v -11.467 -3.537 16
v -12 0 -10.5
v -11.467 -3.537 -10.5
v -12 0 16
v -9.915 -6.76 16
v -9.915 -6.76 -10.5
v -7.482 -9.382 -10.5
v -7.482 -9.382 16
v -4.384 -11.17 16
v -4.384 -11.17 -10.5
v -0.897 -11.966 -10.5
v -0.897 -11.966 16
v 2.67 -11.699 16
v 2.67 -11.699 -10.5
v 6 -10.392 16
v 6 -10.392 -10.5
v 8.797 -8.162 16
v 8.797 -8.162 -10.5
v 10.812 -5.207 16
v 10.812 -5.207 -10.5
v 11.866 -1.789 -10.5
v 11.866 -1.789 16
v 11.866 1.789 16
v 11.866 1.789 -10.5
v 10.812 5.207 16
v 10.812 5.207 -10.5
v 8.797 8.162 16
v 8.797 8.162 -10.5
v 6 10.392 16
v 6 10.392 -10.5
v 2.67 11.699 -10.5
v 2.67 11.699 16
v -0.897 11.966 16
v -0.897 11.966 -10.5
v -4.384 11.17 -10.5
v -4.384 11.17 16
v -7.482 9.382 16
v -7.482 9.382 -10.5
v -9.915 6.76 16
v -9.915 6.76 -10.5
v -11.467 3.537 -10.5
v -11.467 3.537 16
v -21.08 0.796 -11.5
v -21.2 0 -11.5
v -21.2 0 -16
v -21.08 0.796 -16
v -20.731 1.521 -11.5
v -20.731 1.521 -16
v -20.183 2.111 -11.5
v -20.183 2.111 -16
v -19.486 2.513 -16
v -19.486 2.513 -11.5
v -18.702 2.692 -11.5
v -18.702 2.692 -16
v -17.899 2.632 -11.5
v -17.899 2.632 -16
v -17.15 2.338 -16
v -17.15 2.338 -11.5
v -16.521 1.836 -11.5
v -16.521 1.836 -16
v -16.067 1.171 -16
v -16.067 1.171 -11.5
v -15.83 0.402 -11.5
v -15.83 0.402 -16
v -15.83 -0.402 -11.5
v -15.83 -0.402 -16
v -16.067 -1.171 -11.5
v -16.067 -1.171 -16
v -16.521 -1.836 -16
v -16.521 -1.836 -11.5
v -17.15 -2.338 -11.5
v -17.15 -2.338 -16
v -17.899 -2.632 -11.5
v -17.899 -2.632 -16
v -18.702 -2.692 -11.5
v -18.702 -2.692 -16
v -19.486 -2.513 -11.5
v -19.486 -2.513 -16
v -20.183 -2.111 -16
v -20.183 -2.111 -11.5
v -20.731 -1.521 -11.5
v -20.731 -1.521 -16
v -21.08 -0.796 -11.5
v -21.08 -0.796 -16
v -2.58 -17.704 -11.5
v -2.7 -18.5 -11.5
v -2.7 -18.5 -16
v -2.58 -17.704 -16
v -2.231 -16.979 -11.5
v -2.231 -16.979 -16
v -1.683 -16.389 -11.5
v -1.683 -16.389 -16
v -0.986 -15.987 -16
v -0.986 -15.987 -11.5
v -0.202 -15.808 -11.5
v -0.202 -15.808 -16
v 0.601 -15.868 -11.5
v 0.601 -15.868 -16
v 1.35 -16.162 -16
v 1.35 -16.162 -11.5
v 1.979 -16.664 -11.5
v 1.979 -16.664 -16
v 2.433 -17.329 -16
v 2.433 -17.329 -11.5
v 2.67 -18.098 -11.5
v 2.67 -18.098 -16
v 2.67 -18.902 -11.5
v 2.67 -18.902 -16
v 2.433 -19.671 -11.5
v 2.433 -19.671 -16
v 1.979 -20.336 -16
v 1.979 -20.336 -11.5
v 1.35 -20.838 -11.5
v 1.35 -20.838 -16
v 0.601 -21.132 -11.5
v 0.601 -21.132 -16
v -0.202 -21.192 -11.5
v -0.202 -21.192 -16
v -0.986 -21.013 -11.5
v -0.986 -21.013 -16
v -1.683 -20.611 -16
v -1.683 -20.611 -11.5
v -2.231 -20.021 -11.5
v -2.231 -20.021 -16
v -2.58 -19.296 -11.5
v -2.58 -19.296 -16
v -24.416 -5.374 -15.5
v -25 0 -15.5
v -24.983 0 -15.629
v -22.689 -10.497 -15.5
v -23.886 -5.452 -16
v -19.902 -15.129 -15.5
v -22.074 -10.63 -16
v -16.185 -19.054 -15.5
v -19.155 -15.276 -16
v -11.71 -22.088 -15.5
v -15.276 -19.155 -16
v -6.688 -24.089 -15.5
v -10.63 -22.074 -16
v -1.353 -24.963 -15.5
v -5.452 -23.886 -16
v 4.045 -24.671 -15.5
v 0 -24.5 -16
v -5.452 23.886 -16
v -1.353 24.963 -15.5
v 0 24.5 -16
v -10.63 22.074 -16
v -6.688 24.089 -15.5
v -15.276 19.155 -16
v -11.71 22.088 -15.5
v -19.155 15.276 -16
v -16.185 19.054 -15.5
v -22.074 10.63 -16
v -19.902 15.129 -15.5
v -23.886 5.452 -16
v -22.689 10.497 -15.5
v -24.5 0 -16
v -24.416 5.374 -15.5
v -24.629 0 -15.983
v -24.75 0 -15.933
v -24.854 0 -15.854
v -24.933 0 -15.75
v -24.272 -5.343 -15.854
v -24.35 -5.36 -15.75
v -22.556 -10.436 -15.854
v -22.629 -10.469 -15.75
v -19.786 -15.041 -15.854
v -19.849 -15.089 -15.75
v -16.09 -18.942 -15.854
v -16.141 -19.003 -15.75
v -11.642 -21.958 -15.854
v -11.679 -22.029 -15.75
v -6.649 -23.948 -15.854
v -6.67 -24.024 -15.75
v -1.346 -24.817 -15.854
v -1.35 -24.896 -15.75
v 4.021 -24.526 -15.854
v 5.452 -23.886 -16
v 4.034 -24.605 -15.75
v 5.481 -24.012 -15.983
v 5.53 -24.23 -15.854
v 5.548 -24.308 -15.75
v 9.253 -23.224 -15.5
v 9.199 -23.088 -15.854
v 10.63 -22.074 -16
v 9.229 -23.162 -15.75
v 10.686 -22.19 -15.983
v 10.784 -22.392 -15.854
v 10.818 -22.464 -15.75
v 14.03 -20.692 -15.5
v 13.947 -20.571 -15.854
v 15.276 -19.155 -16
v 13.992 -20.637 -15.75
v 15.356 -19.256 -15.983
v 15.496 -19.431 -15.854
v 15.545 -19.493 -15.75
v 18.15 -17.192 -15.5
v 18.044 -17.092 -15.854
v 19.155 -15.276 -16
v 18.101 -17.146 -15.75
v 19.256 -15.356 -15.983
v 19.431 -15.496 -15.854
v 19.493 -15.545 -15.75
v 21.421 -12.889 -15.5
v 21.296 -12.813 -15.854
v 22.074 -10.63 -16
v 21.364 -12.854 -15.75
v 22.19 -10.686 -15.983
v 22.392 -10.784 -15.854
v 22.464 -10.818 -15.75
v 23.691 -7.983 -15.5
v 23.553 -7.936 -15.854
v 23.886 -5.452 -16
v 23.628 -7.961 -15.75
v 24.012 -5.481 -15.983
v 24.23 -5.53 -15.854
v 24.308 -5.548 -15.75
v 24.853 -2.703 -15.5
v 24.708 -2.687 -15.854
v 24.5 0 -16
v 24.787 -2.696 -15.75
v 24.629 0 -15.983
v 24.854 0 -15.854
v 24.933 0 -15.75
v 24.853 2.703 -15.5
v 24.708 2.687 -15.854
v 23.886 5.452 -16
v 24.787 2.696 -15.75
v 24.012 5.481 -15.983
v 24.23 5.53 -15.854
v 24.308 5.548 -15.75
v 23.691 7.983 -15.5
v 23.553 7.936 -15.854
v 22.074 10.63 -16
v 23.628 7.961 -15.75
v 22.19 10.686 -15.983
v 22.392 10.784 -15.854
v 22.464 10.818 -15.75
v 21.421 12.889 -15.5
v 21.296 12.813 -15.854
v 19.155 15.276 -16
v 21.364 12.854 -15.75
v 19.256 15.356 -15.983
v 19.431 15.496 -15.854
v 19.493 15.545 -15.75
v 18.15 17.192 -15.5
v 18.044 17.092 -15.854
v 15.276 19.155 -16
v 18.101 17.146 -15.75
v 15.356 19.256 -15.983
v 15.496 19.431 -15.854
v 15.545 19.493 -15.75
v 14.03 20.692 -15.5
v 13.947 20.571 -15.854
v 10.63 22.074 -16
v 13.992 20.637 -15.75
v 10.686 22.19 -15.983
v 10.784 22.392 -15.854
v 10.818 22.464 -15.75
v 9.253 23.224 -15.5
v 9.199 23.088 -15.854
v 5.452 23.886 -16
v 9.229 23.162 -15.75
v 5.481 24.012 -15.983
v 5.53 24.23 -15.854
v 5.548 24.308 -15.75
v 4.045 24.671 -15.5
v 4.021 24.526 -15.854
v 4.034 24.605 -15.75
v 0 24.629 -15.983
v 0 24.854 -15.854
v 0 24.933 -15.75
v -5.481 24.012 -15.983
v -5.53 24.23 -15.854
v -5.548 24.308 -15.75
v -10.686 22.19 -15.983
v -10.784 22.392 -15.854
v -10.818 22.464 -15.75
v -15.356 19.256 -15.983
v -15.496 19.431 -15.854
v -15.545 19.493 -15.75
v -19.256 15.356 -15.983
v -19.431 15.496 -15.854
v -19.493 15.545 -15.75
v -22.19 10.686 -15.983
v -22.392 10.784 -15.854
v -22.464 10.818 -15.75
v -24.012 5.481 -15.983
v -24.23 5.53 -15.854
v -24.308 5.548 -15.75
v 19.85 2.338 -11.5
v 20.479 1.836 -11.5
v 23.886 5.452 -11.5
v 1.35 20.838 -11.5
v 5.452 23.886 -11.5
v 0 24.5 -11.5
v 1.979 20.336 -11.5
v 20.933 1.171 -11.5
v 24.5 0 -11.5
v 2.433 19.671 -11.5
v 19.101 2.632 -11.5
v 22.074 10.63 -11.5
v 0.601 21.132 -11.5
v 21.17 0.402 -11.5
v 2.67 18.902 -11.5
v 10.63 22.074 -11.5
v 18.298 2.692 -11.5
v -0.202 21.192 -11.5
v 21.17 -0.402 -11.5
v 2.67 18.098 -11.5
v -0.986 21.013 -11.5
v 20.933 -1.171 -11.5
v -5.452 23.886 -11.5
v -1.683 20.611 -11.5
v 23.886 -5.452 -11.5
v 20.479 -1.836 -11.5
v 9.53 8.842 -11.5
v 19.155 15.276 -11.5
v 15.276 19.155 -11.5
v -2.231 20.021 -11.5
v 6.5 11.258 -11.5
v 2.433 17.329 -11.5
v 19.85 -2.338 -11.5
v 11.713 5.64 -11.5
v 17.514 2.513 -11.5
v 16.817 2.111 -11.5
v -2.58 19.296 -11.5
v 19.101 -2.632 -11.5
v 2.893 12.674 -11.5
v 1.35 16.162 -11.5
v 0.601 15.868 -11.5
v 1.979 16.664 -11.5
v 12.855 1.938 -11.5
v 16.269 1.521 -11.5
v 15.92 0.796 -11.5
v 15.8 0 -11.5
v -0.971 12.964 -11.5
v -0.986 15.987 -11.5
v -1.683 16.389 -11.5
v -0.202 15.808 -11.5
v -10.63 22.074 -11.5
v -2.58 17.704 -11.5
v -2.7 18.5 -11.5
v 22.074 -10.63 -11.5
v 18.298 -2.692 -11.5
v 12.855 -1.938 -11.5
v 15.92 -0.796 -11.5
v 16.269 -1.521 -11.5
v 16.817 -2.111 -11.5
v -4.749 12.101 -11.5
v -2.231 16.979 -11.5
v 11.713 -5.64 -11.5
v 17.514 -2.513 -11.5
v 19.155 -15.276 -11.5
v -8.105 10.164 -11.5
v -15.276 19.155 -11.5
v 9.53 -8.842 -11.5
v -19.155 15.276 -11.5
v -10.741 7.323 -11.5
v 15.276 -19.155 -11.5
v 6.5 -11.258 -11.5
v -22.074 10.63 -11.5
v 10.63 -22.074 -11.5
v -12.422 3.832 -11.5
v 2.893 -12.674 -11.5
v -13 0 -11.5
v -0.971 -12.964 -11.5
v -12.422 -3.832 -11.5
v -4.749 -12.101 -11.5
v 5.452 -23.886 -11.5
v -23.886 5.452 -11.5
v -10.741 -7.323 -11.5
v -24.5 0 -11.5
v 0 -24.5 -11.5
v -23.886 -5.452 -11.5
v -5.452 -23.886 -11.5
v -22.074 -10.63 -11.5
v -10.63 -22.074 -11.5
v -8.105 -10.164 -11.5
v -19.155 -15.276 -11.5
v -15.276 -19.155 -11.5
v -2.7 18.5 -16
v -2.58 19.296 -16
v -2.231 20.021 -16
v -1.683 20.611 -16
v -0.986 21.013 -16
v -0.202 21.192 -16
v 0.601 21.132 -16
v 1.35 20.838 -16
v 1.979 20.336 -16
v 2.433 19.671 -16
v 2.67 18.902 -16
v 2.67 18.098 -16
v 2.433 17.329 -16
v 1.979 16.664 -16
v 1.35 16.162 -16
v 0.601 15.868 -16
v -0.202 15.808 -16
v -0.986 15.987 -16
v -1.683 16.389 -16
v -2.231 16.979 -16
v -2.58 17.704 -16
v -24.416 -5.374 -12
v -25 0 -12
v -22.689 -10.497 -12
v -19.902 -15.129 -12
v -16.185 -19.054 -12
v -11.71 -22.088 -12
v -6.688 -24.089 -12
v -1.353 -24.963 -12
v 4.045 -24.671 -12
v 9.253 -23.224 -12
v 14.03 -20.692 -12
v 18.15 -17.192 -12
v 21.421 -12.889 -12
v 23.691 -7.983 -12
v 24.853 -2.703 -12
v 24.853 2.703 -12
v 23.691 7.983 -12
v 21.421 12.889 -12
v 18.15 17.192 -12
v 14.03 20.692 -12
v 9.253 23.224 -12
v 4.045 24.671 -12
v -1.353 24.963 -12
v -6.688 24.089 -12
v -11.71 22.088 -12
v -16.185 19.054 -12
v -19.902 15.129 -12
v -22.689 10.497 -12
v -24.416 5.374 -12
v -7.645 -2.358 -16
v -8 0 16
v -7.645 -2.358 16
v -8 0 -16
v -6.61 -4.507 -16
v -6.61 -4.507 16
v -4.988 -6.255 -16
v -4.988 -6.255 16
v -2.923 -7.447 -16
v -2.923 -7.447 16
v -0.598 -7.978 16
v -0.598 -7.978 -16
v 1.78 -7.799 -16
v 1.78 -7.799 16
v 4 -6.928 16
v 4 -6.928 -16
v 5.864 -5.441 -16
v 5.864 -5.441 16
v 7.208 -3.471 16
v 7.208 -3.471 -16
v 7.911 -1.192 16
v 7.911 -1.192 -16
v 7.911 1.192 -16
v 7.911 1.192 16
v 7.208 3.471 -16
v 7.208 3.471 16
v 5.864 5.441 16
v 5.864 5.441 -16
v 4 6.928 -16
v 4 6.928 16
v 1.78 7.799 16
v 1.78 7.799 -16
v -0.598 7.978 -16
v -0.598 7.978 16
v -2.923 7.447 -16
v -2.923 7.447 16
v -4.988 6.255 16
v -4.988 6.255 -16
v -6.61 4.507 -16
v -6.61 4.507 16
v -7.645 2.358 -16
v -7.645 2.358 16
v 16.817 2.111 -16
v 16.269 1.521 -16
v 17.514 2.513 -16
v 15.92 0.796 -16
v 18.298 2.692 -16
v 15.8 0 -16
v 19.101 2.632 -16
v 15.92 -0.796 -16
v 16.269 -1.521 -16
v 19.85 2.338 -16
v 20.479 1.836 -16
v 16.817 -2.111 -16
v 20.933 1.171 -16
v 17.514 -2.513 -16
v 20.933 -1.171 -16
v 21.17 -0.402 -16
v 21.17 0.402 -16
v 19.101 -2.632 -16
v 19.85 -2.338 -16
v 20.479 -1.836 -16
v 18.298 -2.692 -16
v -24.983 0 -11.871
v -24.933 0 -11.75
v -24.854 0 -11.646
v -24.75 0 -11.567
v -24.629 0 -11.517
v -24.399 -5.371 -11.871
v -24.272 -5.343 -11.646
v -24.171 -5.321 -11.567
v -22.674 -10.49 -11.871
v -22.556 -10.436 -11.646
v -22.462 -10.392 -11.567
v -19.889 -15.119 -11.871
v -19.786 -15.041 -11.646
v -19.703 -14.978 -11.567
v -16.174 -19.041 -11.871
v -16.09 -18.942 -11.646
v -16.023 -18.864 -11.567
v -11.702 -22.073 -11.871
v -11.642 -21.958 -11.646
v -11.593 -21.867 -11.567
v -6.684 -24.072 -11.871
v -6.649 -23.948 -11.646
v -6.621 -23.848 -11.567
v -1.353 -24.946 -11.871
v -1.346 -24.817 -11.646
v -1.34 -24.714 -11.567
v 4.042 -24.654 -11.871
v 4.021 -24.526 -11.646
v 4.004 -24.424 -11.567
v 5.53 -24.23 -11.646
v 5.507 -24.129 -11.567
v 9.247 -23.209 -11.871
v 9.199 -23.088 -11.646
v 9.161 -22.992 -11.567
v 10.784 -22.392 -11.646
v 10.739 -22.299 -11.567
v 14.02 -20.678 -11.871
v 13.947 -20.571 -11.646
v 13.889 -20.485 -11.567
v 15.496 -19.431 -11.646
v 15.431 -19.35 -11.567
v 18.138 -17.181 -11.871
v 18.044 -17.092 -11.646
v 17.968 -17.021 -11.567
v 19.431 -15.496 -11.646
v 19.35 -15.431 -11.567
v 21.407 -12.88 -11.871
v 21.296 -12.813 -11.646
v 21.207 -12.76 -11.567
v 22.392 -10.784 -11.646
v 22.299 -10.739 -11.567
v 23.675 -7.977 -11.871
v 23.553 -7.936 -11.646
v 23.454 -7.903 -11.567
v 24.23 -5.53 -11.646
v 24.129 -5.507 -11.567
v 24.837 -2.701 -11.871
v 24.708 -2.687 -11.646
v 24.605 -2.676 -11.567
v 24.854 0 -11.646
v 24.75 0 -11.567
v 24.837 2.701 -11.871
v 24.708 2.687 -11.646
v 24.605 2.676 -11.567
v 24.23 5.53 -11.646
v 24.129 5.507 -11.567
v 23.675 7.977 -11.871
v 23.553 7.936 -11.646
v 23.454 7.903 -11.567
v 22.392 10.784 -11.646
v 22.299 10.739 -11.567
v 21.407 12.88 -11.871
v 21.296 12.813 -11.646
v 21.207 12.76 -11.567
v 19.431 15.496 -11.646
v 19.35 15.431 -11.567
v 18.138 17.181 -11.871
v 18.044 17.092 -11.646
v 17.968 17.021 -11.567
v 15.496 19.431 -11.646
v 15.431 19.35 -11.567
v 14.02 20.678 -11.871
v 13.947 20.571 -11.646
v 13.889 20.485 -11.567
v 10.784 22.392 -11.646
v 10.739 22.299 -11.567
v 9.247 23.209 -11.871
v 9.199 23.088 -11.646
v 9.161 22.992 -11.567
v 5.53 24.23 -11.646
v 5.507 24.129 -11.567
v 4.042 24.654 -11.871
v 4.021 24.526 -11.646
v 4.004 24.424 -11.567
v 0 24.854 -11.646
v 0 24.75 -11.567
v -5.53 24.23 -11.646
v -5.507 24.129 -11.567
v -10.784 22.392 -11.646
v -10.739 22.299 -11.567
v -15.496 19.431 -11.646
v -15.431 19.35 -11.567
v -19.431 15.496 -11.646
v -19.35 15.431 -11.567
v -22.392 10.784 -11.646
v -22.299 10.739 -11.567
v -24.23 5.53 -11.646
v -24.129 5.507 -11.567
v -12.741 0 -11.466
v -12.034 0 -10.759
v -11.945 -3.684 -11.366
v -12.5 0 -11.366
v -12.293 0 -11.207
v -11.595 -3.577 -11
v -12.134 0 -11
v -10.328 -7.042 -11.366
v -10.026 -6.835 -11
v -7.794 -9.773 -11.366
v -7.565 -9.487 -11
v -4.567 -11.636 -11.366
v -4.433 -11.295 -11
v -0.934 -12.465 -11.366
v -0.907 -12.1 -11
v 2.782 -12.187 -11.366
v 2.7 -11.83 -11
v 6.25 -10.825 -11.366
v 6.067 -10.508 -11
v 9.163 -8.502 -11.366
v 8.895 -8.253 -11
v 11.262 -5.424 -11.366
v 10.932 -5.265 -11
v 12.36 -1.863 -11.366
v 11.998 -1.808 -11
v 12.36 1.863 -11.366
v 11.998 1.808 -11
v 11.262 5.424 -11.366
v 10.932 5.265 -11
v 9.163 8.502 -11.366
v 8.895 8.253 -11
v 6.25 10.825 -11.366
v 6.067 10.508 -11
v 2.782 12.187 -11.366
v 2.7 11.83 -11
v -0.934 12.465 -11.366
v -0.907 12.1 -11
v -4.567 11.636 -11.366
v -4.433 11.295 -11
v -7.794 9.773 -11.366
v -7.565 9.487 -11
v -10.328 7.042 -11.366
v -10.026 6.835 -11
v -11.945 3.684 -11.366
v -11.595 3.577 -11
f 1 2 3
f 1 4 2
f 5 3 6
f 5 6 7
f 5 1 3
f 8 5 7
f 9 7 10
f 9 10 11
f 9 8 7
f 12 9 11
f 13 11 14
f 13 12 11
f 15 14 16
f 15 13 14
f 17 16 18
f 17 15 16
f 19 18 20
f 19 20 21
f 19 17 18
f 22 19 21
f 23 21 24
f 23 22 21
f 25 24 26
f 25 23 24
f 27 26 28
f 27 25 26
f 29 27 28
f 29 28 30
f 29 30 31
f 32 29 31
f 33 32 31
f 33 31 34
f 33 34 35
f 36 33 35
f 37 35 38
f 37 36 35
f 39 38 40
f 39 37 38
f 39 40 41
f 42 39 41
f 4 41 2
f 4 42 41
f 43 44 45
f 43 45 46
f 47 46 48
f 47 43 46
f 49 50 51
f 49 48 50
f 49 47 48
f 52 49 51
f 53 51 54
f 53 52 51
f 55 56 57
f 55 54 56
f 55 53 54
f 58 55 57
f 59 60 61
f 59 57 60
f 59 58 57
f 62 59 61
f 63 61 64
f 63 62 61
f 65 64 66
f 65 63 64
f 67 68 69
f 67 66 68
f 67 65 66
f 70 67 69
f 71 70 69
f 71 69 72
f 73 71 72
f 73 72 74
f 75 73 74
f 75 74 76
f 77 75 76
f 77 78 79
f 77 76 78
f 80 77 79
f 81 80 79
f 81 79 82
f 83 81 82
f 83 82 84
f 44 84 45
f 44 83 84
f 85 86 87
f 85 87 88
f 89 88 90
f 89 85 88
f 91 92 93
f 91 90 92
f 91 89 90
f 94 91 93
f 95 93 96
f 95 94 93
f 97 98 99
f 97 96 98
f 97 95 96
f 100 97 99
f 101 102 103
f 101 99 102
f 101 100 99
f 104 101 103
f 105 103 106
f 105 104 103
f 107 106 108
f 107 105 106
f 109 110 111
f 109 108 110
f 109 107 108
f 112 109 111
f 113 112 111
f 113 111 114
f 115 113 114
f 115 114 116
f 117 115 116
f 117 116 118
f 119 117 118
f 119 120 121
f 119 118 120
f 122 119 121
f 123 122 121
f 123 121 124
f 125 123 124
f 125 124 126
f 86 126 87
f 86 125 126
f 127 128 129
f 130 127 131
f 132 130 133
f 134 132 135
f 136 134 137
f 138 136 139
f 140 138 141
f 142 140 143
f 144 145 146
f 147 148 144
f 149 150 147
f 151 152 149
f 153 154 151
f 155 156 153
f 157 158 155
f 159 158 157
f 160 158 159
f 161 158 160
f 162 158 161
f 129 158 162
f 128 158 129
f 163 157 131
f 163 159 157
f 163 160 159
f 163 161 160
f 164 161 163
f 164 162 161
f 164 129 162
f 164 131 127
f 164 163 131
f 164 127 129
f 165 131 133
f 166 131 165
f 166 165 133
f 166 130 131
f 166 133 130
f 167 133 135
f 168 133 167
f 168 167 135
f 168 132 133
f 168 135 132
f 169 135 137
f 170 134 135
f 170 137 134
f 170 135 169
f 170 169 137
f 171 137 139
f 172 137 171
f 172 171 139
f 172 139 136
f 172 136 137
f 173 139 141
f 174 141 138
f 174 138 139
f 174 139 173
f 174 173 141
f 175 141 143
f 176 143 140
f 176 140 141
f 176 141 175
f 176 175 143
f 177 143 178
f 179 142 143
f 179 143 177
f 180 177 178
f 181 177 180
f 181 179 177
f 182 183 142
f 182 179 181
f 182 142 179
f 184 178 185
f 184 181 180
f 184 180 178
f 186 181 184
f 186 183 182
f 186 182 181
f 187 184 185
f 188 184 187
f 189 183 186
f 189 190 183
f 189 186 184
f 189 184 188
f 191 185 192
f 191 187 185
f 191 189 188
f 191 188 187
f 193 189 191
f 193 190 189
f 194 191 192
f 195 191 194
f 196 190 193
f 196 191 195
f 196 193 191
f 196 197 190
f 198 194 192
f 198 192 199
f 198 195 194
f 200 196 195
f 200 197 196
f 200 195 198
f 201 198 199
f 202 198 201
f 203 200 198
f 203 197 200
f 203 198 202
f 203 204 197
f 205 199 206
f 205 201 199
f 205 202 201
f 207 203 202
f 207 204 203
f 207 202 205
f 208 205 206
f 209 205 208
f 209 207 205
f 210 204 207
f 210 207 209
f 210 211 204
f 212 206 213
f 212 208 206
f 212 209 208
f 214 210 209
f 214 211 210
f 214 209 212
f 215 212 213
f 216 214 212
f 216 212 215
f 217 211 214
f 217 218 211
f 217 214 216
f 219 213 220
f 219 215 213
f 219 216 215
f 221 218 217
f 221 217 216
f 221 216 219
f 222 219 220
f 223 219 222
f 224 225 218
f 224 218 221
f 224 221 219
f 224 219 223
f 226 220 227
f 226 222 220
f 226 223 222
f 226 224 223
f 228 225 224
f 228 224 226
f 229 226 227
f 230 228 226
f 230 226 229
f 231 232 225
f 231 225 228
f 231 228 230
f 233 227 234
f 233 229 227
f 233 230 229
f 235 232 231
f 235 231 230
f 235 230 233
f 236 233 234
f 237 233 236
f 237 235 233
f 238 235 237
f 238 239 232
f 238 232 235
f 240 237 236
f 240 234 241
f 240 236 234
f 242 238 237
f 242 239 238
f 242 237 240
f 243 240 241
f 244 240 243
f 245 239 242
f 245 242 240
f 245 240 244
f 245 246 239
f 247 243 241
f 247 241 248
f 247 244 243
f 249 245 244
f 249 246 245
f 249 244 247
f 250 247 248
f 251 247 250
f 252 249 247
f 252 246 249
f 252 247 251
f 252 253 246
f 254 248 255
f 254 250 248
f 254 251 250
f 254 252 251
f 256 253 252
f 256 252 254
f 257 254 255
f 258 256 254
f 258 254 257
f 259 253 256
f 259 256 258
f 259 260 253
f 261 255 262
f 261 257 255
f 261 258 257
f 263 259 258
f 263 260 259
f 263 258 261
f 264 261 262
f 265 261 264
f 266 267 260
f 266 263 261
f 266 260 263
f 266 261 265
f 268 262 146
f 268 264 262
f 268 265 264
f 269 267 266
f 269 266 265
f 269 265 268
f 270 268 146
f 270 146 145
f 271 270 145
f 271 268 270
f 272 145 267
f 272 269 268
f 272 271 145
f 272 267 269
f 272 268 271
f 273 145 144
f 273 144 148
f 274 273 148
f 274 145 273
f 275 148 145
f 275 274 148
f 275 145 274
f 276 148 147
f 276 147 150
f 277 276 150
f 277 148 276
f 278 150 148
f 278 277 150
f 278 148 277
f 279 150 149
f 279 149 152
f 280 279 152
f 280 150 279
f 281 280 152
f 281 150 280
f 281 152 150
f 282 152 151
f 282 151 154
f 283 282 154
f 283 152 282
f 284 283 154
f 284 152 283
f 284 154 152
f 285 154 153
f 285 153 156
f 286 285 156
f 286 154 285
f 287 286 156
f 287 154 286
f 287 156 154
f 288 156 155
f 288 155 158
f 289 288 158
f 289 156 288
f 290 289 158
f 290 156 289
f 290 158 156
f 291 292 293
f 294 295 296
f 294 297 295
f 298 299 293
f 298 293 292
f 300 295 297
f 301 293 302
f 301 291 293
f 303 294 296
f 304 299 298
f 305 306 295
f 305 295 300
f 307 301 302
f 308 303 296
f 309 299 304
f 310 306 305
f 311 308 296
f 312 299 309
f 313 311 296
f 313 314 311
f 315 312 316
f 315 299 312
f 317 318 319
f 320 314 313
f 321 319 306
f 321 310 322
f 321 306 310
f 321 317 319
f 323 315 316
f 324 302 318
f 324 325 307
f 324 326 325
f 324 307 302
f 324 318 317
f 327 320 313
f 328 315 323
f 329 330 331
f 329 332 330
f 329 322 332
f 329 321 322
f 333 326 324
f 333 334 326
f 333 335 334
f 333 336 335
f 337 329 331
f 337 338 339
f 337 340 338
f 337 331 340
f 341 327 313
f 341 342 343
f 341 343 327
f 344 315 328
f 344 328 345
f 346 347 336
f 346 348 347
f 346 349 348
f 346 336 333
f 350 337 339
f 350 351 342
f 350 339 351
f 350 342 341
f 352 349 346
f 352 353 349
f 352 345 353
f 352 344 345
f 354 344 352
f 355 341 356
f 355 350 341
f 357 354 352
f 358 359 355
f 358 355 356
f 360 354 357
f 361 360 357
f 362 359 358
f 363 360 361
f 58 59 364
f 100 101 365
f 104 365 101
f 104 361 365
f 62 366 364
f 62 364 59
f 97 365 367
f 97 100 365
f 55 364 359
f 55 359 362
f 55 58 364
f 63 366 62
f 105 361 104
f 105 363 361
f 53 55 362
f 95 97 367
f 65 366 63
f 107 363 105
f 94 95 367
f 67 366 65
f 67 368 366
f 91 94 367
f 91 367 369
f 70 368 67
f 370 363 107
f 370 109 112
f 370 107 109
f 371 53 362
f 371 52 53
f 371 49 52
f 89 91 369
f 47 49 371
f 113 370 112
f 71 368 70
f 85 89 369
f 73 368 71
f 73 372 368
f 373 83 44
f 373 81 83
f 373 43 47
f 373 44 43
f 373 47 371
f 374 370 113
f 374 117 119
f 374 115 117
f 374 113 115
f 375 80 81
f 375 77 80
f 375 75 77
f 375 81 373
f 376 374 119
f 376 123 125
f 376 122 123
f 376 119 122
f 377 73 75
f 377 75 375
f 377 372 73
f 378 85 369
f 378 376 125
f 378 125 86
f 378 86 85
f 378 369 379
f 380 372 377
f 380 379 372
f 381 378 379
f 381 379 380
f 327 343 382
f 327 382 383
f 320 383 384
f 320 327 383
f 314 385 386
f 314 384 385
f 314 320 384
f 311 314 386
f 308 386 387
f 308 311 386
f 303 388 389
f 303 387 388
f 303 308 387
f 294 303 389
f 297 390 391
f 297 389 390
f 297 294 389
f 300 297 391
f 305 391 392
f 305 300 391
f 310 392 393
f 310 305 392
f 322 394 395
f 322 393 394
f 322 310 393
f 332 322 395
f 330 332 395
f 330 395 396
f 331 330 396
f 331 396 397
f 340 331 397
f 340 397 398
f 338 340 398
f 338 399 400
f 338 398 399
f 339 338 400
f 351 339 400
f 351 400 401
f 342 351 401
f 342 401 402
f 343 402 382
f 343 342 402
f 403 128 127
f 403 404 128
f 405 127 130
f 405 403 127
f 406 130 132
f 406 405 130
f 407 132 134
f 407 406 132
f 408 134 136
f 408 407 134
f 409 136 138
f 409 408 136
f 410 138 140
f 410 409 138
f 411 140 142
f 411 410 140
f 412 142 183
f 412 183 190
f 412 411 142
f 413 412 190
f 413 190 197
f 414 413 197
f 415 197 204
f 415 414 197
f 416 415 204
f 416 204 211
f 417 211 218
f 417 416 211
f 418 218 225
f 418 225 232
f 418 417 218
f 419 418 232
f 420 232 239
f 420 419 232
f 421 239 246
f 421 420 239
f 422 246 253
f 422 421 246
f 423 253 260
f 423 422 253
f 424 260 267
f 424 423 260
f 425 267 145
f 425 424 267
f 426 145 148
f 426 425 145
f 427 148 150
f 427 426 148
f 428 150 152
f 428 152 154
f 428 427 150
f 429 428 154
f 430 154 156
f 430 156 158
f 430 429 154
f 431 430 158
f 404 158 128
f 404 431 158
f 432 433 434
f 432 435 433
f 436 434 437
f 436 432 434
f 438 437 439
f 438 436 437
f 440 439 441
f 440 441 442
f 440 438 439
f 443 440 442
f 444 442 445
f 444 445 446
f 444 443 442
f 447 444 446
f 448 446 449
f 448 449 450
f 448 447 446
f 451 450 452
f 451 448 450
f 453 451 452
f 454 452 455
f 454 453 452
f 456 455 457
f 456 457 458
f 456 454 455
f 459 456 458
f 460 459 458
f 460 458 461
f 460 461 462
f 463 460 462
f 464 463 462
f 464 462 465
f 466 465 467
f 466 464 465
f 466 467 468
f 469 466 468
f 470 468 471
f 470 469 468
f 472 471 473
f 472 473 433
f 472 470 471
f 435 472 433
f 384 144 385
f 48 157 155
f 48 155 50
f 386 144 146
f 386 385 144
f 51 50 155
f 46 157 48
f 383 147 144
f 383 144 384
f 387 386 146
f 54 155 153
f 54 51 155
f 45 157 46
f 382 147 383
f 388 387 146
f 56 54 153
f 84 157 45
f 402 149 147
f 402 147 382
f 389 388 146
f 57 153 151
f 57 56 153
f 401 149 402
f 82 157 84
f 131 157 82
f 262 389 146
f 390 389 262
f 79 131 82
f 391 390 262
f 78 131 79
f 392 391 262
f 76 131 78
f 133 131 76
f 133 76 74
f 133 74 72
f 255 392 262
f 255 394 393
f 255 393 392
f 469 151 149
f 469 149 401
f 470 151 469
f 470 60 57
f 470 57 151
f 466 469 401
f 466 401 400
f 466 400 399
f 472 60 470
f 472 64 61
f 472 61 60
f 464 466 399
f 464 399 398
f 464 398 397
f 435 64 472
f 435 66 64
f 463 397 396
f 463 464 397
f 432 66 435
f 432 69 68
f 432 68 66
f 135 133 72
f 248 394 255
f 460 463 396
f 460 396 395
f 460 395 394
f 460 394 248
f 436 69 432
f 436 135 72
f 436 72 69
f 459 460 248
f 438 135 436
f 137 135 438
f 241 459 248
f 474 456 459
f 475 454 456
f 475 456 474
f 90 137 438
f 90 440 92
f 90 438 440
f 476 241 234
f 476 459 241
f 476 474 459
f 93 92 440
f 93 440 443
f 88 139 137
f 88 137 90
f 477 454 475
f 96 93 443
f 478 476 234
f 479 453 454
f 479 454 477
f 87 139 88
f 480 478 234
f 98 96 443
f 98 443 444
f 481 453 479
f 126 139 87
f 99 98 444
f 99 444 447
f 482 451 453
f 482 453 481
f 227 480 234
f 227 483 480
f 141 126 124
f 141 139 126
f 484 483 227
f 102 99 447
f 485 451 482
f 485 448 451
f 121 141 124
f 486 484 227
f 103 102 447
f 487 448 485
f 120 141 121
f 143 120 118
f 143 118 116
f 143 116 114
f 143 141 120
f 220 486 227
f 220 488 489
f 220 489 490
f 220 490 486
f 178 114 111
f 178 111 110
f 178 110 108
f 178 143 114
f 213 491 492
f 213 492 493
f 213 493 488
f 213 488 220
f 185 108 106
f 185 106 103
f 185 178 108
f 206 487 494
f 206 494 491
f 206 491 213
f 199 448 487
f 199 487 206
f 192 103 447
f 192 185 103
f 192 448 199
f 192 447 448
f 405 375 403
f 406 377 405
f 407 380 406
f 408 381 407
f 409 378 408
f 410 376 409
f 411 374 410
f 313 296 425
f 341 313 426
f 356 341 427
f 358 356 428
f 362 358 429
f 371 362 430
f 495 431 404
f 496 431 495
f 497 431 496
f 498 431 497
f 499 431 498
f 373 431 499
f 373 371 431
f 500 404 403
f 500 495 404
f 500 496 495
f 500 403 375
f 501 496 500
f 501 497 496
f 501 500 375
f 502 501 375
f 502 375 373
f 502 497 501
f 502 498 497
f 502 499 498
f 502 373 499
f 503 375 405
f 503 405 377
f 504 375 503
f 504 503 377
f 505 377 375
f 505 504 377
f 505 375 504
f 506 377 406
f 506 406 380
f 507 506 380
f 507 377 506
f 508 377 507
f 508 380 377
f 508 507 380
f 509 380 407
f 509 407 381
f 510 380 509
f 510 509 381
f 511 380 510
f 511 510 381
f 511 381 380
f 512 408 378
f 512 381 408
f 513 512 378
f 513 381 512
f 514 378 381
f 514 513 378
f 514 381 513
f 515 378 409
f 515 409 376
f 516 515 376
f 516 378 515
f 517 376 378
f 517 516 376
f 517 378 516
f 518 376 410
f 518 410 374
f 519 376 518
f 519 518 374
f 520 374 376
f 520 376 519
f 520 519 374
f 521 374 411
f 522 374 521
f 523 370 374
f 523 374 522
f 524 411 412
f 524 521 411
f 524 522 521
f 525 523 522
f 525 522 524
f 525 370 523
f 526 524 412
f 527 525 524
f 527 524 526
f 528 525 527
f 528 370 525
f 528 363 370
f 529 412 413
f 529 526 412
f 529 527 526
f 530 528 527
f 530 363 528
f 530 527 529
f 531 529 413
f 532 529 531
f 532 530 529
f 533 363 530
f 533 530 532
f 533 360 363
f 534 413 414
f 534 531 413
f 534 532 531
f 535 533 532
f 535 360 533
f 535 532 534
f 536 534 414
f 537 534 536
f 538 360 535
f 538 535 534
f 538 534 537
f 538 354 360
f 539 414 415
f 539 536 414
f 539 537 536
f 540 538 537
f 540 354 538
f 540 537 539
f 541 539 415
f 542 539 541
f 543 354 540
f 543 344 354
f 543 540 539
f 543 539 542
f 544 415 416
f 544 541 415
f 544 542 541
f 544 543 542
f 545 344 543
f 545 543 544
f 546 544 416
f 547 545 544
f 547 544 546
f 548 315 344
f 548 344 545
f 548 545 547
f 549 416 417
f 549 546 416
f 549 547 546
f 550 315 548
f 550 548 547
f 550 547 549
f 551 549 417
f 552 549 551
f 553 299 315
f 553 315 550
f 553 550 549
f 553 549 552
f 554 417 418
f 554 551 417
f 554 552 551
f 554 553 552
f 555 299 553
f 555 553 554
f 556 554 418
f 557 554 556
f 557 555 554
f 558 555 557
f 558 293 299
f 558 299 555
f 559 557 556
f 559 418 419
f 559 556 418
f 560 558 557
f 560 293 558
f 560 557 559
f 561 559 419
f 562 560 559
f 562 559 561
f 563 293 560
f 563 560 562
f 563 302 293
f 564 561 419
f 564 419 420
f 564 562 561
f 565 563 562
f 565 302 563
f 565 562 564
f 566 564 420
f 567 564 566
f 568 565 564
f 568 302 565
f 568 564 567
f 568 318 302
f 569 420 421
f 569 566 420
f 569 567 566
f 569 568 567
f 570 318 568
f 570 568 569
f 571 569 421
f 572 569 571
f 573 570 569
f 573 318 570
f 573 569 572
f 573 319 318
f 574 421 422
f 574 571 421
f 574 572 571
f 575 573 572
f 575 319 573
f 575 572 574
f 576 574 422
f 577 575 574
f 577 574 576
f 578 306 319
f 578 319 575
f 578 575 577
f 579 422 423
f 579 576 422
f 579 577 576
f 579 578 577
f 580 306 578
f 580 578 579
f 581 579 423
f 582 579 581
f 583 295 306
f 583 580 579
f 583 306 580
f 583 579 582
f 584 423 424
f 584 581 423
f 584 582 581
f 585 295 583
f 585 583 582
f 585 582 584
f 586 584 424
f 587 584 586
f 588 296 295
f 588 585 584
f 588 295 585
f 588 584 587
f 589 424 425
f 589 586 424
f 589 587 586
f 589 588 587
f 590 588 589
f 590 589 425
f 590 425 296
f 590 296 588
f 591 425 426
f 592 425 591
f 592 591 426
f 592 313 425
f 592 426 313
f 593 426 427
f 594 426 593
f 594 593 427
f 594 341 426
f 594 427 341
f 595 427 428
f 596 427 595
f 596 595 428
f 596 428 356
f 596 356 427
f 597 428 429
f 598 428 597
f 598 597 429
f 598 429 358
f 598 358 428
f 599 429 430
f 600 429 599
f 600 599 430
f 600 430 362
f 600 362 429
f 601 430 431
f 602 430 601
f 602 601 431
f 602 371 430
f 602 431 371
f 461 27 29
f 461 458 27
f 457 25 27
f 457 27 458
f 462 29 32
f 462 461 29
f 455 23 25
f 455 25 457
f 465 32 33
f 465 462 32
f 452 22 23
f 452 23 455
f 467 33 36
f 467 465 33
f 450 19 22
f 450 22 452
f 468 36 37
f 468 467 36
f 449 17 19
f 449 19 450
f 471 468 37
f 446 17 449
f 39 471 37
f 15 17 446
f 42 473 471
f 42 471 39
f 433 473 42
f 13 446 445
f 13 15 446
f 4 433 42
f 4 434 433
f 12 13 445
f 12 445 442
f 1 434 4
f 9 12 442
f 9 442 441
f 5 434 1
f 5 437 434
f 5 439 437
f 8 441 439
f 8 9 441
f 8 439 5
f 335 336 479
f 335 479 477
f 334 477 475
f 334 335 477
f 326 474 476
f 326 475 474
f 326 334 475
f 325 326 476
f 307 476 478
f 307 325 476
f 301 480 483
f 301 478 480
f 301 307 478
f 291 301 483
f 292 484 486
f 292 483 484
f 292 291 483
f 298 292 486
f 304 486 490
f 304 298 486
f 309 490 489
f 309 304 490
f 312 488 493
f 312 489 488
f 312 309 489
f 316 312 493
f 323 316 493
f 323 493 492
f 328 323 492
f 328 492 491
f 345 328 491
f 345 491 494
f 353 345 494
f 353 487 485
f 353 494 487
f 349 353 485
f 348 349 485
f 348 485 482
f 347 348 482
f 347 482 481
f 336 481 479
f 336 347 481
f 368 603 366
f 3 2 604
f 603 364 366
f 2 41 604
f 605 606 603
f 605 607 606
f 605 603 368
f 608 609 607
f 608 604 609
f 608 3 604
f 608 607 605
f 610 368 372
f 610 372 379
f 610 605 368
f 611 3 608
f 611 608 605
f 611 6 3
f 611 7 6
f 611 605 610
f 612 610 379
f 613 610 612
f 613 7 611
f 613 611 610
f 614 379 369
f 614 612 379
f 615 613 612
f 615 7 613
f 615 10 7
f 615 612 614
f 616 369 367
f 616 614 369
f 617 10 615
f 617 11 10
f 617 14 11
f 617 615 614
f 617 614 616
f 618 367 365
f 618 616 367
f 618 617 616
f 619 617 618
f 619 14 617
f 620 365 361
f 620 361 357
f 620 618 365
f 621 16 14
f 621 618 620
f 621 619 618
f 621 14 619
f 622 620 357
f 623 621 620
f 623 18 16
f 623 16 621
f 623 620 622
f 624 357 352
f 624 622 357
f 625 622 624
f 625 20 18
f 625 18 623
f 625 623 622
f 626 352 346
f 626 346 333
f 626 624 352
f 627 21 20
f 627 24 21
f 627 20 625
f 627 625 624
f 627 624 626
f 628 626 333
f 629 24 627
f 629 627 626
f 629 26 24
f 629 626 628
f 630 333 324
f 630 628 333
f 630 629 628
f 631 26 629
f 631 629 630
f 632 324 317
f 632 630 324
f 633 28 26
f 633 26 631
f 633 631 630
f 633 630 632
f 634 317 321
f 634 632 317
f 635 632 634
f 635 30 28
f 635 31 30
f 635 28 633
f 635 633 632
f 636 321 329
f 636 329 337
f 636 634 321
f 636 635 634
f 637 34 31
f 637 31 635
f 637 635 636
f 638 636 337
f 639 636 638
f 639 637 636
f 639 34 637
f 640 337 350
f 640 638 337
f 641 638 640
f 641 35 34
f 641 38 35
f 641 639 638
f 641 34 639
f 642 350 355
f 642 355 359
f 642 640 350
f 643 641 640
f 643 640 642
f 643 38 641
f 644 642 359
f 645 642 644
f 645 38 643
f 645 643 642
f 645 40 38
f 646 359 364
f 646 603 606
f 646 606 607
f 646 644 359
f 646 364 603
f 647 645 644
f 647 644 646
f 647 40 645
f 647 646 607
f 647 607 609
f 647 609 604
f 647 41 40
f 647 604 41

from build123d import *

# Parameters (mm, degrees)
CUT_EXTRUDE1_DEPTH      = 48.68647607
CUT_EXTRUDE1_DEPTH_BACK = 48.68647607
SKETCH2_R               = 2.7


with BuildPart() as part:
    # Sketch1 → Revolve1 (revolve)
    with BuildSketch(Plane(origin=(0, 0, 0), x_dir=(0, 0, -1), z_dir=(1, 0, 0)), mode=Mode.PRIVATE) as revolve1_sk:
        with BuildLine():
            Line((-16, 8), (16, 8))
            Line((16, 8), (16, 24.5))
            ThreePointArc((16, 24.5), (15.853553391, 24.853553391), (15.5, 25))
            Line((15.5, 25), (12, 25))
            ThreePointArc((12, 25), (11.646446609, 24.853553391), (11.5, 24.5))
            Line((11.5, 24.5), (11.5, 13))
            ThreePointArc((11.5, 13), (11.207106781, 12.292893219), (10.5, 12))
            Line((10.5, 12), (-16, 12))
            Line((-16, 12), (-16, 8))
        make_face()
    revolve(revolve1_sk.sketch.rotate(Axis((0, 0, 0), (0, 0, 1)), 90), axis=Axis((0, 0, 0), (0, 0, 1)))

    # Sketch2 → Cut-Extrude1 (cut, two sides: drawn at the far end of the back side and taken through both)
    with BuildSketch(Plane(origin=(0, 0, -16), x_dir=(-1, 0, 0), z_dir=(0, 0, -1)).offset(-CUT_EXTRUDE1_DEPTH_BACK)):
        with Locations((0, 18.5)):
            Circle(SKETCH2_R)
        with Locations((18.5, 0)):
            Circle(SKETCH2_R)
        with Locations((0, -18.5)):
            Circle(SKETCH2_R)
        with Locations((-18.5, 0)):
            Circle(SKETCH2_R)
    extrude(amount=CUT_EXTRUDE1_DEPTH + CUT_EXTRUDE1_DEPTH_BACK, mode=Mode.SUBTRACT)


solid = part.part
